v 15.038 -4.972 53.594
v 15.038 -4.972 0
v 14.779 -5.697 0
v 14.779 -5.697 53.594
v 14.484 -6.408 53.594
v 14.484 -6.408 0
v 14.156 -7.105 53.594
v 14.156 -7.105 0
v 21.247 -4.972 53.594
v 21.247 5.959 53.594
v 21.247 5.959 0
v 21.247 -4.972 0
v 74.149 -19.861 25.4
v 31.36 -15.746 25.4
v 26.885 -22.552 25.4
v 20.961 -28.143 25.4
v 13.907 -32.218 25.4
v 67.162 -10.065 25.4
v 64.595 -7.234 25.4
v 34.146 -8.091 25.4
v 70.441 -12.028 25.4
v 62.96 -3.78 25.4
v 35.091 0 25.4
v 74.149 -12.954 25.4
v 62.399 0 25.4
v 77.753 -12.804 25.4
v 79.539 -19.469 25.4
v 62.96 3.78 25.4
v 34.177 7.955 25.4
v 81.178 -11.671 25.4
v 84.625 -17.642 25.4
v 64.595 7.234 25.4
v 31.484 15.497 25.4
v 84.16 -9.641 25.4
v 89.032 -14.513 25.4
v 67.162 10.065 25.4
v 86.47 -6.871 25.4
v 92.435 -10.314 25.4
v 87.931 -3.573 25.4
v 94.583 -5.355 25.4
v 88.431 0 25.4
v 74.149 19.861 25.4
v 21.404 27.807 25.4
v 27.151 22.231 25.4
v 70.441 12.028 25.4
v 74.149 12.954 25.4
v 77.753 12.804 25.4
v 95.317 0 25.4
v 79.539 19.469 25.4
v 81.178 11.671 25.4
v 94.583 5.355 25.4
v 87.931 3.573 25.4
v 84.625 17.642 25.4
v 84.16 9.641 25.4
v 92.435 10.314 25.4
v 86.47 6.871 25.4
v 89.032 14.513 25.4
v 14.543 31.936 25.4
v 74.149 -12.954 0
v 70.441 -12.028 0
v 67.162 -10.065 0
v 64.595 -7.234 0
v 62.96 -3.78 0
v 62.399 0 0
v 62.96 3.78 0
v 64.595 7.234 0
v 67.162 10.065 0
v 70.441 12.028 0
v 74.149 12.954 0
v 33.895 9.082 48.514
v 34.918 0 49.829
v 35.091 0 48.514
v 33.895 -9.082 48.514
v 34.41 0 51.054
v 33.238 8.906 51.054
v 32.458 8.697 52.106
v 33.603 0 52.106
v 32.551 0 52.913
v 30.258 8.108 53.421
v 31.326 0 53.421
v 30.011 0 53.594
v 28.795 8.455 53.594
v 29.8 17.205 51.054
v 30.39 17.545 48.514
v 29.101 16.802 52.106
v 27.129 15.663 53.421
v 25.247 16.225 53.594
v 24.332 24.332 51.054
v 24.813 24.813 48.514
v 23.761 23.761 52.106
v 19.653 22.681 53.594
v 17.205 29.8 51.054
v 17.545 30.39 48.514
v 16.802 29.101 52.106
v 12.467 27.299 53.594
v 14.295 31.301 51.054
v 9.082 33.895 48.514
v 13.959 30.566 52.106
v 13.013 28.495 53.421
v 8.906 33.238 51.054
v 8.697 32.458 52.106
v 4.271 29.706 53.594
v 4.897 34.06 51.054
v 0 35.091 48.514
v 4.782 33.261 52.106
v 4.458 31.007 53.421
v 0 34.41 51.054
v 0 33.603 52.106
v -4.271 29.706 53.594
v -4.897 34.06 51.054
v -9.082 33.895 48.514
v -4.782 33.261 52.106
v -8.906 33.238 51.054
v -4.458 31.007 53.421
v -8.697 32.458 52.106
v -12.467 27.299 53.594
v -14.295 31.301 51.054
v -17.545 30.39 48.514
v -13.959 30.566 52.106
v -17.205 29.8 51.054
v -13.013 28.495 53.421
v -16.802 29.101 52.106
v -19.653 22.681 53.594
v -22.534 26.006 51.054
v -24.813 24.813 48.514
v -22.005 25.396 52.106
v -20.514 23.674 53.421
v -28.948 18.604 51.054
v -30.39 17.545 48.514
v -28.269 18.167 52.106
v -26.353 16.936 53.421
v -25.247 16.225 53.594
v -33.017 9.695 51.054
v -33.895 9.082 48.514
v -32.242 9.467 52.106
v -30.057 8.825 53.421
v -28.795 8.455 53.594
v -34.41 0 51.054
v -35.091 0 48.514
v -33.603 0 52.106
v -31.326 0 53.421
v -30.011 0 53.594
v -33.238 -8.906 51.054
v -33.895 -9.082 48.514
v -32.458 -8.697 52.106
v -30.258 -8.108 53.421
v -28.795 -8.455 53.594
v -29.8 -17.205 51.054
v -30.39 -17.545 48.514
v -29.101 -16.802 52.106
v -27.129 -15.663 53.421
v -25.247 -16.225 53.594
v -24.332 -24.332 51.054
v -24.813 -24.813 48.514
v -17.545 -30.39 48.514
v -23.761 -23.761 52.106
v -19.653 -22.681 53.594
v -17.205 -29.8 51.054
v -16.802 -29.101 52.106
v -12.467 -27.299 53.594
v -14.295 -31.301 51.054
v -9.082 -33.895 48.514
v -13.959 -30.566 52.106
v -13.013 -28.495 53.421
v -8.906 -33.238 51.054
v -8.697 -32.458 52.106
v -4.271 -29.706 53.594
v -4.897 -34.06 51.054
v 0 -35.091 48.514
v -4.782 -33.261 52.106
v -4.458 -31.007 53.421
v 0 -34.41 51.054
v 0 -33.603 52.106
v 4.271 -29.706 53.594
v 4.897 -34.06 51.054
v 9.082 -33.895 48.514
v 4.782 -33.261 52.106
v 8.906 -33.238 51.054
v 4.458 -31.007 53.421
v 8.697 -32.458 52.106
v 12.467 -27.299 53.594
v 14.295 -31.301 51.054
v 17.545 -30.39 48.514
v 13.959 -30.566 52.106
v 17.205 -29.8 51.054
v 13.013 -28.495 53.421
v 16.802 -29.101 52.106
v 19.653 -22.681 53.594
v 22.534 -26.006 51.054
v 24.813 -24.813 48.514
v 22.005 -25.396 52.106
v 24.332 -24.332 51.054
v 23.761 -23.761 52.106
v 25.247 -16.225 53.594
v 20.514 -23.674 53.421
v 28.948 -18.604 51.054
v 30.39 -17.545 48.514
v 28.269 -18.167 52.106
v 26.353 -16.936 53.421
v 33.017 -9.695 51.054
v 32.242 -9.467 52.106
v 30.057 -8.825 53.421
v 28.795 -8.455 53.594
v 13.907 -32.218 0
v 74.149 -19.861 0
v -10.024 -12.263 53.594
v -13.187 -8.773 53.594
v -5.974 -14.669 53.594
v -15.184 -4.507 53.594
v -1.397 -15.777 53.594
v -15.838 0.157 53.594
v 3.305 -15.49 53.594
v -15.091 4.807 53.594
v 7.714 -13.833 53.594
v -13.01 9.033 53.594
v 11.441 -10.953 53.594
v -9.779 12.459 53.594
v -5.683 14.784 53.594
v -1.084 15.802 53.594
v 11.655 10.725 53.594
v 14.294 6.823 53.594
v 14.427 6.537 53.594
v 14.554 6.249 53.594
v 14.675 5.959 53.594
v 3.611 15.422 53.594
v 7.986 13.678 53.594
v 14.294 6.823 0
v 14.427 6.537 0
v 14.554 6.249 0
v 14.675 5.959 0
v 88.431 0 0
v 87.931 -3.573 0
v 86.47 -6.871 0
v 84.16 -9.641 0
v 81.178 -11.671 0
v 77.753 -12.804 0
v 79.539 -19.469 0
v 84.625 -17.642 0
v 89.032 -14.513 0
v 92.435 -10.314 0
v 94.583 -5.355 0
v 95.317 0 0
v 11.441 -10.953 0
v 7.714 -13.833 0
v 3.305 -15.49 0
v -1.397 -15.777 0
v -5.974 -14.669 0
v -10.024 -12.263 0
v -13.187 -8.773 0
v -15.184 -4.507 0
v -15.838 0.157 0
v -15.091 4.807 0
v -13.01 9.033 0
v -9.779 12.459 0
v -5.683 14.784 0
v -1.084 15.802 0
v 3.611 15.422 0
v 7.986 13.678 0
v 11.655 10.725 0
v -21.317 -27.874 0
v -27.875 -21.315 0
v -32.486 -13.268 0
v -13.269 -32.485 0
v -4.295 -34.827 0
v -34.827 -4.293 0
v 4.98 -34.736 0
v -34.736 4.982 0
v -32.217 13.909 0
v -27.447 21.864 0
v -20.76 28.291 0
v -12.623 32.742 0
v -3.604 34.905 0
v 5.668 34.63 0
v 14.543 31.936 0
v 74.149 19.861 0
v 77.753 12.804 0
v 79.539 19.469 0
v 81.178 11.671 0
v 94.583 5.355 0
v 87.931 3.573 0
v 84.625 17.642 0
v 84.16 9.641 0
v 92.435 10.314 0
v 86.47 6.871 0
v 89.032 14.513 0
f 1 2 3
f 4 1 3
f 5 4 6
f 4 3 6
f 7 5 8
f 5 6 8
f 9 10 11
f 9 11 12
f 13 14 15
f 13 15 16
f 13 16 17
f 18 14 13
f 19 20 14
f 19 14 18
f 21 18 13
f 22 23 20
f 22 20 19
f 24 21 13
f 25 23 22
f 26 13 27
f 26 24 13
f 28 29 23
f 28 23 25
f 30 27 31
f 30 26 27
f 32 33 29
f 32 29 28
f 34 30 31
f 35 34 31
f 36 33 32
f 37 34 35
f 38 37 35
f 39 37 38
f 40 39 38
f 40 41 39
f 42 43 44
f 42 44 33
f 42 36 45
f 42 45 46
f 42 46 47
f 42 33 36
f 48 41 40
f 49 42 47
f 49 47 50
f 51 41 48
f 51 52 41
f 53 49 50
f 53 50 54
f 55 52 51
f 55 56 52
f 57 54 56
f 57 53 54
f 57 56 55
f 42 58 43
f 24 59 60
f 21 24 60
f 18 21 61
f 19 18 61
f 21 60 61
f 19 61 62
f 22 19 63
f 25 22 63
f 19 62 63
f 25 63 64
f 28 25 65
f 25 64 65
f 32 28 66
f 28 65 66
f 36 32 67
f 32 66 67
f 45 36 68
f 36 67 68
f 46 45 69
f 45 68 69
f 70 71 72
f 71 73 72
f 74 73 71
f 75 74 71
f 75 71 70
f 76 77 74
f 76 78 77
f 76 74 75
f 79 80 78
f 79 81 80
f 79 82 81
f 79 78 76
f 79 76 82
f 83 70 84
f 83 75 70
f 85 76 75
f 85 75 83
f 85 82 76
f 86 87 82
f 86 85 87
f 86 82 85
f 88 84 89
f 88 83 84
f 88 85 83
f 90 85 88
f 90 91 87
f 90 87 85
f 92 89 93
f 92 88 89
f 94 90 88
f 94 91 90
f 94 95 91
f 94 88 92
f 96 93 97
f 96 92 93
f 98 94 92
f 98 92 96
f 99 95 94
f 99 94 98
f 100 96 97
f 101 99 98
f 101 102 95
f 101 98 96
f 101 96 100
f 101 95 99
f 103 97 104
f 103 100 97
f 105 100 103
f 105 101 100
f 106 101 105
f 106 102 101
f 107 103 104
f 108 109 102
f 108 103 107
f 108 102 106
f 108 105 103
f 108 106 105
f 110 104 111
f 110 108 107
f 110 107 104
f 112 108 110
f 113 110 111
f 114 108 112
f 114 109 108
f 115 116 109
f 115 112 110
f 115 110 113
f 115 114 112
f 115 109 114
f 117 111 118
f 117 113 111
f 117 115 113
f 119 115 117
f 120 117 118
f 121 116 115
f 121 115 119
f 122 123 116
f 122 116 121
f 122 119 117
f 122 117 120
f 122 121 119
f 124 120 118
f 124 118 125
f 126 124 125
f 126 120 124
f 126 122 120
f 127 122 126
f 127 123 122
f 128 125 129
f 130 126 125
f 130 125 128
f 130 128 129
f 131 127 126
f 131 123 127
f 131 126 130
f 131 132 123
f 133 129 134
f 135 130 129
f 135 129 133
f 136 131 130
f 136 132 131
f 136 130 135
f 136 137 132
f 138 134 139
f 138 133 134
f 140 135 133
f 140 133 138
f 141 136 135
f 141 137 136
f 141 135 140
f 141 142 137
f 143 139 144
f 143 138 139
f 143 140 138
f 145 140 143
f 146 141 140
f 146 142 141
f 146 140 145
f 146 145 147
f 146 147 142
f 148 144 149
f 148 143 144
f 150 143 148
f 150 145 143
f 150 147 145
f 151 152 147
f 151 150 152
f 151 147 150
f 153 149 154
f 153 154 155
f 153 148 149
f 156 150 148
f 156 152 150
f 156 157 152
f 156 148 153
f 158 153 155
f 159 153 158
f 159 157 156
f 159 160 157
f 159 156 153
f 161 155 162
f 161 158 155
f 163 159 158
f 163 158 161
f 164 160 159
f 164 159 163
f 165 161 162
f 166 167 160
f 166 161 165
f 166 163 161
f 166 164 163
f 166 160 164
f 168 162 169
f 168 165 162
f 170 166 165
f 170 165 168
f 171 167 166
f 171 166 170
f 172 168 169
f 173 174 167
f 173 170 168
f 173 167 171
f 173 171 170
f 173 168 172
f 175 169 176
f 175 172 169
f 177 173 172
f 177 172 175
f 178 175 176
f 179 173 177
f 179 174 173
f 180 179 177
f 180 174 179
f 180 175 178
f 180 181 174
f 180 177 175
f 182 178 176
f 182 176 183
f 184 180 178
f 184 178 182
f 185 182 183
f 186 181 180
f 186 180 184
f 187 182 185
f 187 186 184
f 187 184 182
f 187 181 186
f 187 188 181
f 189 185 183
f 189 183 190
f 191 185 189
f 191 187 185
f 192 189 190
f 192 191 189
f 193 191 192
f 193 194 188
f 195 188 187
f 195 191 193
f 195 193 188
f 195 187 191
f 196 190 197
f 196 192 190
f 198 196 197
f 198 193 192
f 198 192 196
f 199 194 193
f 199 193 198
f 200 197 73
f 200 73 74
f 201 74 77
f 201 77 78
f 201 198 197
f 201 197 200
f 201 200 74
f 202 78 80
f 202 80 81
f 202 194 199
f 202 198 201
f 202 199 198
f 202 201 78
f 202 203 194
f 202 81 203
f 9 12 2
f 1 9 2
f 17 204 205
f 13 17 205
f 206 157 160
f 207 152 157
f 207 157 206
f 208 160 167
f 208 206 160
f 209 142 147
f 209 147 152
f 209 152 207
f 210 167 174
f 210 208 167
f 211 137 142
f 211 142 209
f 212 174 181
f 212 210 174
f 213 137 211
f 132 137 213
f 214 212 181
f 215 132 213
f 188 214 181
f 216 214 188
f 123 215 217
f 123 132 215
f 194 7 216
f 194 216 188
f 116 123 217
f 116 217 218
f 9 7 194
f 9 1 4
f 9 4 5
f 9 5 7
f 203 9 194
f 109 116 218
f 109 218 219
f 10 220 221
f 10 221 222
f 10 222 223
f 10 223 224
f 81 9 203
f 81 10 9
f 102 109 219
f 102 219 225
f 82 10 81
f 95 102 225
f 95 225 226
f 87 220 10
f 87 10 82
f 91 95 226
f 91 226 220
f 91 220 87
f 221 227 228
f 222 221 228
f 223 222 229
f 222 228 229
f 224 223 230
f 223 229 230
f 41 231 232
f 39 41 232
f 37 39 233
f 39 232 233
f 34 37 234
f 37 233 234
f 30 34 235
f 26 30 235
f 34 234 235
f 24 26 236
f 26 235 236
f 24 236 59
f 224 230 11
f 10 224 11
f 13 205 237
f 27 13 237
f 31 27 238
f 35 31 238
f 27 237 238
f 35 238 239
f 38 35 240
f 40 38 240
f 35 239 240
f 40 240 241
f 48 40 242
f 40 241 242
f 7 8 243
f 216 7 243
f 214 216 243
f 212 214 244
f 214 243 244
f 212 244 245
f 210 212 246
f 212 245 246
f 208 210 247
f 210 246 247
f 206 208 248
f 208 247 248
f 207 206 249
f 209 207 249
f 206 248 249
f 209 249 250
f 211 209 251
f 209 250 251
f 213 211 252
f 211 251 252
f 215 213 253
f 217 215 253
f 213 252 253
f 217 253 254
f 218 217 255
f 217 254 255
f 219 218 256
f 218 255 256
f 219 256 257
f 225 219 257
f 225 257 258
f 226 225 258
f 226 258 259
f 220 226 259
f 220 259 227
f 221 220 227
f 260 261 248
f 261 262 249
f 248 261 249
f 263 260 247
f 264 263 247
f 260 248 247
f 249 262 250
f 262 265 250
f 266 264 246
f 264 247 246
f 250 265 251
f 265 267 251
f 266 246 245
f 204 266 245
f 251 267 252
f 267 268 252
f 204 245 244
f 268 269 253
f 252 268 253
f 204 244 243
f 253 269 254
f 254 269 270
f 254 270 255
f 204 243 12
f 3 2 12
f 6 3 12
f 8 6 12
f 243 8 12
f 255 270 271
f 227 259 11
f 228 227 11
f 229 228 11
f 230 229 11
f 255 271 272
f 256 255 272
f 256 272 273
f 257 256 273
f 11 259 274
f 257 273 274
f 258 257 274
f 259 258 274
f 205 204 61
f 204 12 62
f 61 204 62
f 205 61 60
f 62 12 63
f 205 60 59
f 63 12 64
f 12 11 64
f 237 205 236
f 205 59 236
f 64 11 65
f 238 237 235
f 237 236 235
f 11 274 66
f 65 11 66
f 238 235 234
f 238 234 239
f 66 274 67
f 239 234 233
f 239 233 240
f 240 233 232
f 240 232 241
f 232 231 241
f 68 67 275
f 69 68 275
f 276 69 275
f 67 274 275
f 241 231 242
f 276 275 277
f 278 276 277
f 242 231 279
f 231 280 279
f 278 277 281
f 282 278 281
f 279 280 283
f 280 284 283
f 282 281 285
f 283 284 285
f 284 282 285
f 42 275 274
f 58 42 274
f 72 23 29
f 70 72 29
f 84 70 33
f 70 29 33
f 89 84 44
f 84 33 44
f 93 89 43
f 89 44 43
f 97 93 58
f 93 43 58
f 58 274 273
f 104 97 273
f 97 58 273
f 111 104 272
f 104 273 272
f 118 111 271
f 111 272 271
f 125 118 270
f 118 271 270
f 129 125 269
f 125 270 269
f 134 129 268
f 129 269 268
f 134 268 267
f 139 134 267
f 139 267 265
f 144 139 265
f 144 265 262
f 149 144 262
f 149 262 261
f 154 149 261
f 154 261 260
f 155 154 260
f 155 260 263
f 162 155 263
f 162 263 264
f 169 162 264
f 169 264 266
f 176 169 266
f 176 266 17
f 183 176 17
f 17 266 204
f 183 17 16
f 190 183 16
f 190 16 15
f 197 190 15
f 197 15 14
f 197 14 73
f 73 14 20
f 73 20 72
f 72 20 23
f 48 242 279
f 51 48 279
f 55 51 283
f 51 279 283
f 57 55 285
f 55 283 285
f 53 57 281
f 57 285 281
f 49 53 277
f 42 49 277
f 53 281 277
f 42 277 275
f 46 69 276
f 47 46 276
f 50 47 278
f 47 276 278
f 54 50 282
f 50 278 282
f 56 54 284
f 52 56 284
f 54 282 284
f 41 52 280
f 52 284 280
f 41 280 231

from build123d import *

# Parameters (mm, degrees)
F1_DEPTH = 53.594
F2_DEPTH = 25.4
F3_R     = 5.08


with BuildPart() as f1:
    # F0 (on Top) → F1 (new body)
    with BuildSketch(Plane.XY):
        with BuildLine():
            Line((14.2938200345, 6.8228022219), (14.5426443405, 31.9357120423))
            ThreePointArc((14.5426443405, 31.9357120423), (-35.0892765953, 0.3476723709), (13.9069990558, -32.217597448))
            Line((13.9069990558, -32.217597448), (14.1558233618, -7.1046876277))
            ThreePointArc((14.1558233618, -7.1046876277), (-15.8379069236, 0.1569255107), (14.2938200345, 6.8228022219))
        make_face()
        with BuildLine():
            ThreePointArc((13.9069990558, -32.217597448), (29.3205448233, -19.2791042148), (35.0909989607, 0))
            ThreePointArc((35.0909989607, 0), (29.5101179725, 18.98765771), (14.5426443405, 31.9357120423))
            Line((14.5426443405, 31.9357120423), (14.2938200345, 6.8228022219))
            ThreePointArc((14.2938200345, 6.8228022219), (14.4908058573, 6.3937834608), (14.6749184523, 5.9590846408))
            Line((14.6749184523, 5.9590846408), (21.2465617806, 5.9590846408))
            Line((21.2465617806, 5.9590846408), (21.2465617806, 0))
            Line((21.2465617806, 0), (21.2465617806, -4.9716657959))
            Line((21.2465617806, -4.9716657959), (15.0381667949, -4.9716657959))
            ThreePointArc((15.0381667949, -4.9716657959), (14.6359048525, -6.0542720856), (14.1558233618, -7.1046876277))
            Line((14.1558233618, -7.1046876277), (13.9069990558, -32.217597448))
        make_face()
    extrude(amount=F1_DEPTH)

    # F0 (on Top) → F2 (join)
    with BuildSketch(Plane.XY):
        with BuildLine():
            ThreePointArc((14.5426443405, 31.9357120423), (29.5101179725, 18.98765771), (35.0909989607, 0))
            ThreePointArc((35.0909989607, 0), (29.3205448233, -19.2791042148), (13.9069990558, -32.217597448))
            Line((13.9069990558, -32.217597448), (74.1487775429, -19.8608903789))
            ThreePointArc((74.1487775429, -19.8608903789), (55.5140801332, 0), (74.1487775429, 19.8608903789))
            Line((74.1487775429, 19.8608903789), (14.5426443405, 31.9357120423))
        make_face()
        with BuildLine():
            ThreePointArc((95.3165463545, 0), (89.0324615704, 14.5131785208), (74.1487775429, 19.8608903789))
            Line((74.1487775429, 19.8608903789), (74.1487775429, 12.9542538791))
            ThreePointArc((74.1487775429, 12.9542538791), (84.1597843769, 9.6411114946), (88.4313343812, 0))
            ThreePointArc((88.4313343812, 0), (84.1597843769, -9.6411114946), (74.1487775429, -12.9542538791))
            Line((74.1487775429, -12.9542538791), (74.1487775429, -19.8608903789))
            ThreePointArc((74.1487775429, -19.8608903789), (89.0324615704, -14.5131785208), (95.3165463545, 0))
        make_face()
        with BuildLine():
            Line((74.1487775429, 12.9542538791), (74.1487775429, 19.8608903789))
            ThreePointArc((74.1487775429, 19.8608903789), (55.5140801332, 0), (74.1487775429, -19.8608903789))
            Line((74.1487775429, -19.8608903789), (74.1487775429, -12.9542538791))
            ThreePointArc((74.1487775429, -12.9542538791), (62.3992921066, 0), (74.1487775429, 12.9542538791))
        make_face()
    extrude(amount=F2_DEPTH)

    # F3
    f3_edges = [f1.edges().sort_by_distance(p)[0] for p in [
        (-13.906999, 32.217597, 53.594),
    ]]
    fillet(f3_edges, radius=F3_R)


solid = f1.part
